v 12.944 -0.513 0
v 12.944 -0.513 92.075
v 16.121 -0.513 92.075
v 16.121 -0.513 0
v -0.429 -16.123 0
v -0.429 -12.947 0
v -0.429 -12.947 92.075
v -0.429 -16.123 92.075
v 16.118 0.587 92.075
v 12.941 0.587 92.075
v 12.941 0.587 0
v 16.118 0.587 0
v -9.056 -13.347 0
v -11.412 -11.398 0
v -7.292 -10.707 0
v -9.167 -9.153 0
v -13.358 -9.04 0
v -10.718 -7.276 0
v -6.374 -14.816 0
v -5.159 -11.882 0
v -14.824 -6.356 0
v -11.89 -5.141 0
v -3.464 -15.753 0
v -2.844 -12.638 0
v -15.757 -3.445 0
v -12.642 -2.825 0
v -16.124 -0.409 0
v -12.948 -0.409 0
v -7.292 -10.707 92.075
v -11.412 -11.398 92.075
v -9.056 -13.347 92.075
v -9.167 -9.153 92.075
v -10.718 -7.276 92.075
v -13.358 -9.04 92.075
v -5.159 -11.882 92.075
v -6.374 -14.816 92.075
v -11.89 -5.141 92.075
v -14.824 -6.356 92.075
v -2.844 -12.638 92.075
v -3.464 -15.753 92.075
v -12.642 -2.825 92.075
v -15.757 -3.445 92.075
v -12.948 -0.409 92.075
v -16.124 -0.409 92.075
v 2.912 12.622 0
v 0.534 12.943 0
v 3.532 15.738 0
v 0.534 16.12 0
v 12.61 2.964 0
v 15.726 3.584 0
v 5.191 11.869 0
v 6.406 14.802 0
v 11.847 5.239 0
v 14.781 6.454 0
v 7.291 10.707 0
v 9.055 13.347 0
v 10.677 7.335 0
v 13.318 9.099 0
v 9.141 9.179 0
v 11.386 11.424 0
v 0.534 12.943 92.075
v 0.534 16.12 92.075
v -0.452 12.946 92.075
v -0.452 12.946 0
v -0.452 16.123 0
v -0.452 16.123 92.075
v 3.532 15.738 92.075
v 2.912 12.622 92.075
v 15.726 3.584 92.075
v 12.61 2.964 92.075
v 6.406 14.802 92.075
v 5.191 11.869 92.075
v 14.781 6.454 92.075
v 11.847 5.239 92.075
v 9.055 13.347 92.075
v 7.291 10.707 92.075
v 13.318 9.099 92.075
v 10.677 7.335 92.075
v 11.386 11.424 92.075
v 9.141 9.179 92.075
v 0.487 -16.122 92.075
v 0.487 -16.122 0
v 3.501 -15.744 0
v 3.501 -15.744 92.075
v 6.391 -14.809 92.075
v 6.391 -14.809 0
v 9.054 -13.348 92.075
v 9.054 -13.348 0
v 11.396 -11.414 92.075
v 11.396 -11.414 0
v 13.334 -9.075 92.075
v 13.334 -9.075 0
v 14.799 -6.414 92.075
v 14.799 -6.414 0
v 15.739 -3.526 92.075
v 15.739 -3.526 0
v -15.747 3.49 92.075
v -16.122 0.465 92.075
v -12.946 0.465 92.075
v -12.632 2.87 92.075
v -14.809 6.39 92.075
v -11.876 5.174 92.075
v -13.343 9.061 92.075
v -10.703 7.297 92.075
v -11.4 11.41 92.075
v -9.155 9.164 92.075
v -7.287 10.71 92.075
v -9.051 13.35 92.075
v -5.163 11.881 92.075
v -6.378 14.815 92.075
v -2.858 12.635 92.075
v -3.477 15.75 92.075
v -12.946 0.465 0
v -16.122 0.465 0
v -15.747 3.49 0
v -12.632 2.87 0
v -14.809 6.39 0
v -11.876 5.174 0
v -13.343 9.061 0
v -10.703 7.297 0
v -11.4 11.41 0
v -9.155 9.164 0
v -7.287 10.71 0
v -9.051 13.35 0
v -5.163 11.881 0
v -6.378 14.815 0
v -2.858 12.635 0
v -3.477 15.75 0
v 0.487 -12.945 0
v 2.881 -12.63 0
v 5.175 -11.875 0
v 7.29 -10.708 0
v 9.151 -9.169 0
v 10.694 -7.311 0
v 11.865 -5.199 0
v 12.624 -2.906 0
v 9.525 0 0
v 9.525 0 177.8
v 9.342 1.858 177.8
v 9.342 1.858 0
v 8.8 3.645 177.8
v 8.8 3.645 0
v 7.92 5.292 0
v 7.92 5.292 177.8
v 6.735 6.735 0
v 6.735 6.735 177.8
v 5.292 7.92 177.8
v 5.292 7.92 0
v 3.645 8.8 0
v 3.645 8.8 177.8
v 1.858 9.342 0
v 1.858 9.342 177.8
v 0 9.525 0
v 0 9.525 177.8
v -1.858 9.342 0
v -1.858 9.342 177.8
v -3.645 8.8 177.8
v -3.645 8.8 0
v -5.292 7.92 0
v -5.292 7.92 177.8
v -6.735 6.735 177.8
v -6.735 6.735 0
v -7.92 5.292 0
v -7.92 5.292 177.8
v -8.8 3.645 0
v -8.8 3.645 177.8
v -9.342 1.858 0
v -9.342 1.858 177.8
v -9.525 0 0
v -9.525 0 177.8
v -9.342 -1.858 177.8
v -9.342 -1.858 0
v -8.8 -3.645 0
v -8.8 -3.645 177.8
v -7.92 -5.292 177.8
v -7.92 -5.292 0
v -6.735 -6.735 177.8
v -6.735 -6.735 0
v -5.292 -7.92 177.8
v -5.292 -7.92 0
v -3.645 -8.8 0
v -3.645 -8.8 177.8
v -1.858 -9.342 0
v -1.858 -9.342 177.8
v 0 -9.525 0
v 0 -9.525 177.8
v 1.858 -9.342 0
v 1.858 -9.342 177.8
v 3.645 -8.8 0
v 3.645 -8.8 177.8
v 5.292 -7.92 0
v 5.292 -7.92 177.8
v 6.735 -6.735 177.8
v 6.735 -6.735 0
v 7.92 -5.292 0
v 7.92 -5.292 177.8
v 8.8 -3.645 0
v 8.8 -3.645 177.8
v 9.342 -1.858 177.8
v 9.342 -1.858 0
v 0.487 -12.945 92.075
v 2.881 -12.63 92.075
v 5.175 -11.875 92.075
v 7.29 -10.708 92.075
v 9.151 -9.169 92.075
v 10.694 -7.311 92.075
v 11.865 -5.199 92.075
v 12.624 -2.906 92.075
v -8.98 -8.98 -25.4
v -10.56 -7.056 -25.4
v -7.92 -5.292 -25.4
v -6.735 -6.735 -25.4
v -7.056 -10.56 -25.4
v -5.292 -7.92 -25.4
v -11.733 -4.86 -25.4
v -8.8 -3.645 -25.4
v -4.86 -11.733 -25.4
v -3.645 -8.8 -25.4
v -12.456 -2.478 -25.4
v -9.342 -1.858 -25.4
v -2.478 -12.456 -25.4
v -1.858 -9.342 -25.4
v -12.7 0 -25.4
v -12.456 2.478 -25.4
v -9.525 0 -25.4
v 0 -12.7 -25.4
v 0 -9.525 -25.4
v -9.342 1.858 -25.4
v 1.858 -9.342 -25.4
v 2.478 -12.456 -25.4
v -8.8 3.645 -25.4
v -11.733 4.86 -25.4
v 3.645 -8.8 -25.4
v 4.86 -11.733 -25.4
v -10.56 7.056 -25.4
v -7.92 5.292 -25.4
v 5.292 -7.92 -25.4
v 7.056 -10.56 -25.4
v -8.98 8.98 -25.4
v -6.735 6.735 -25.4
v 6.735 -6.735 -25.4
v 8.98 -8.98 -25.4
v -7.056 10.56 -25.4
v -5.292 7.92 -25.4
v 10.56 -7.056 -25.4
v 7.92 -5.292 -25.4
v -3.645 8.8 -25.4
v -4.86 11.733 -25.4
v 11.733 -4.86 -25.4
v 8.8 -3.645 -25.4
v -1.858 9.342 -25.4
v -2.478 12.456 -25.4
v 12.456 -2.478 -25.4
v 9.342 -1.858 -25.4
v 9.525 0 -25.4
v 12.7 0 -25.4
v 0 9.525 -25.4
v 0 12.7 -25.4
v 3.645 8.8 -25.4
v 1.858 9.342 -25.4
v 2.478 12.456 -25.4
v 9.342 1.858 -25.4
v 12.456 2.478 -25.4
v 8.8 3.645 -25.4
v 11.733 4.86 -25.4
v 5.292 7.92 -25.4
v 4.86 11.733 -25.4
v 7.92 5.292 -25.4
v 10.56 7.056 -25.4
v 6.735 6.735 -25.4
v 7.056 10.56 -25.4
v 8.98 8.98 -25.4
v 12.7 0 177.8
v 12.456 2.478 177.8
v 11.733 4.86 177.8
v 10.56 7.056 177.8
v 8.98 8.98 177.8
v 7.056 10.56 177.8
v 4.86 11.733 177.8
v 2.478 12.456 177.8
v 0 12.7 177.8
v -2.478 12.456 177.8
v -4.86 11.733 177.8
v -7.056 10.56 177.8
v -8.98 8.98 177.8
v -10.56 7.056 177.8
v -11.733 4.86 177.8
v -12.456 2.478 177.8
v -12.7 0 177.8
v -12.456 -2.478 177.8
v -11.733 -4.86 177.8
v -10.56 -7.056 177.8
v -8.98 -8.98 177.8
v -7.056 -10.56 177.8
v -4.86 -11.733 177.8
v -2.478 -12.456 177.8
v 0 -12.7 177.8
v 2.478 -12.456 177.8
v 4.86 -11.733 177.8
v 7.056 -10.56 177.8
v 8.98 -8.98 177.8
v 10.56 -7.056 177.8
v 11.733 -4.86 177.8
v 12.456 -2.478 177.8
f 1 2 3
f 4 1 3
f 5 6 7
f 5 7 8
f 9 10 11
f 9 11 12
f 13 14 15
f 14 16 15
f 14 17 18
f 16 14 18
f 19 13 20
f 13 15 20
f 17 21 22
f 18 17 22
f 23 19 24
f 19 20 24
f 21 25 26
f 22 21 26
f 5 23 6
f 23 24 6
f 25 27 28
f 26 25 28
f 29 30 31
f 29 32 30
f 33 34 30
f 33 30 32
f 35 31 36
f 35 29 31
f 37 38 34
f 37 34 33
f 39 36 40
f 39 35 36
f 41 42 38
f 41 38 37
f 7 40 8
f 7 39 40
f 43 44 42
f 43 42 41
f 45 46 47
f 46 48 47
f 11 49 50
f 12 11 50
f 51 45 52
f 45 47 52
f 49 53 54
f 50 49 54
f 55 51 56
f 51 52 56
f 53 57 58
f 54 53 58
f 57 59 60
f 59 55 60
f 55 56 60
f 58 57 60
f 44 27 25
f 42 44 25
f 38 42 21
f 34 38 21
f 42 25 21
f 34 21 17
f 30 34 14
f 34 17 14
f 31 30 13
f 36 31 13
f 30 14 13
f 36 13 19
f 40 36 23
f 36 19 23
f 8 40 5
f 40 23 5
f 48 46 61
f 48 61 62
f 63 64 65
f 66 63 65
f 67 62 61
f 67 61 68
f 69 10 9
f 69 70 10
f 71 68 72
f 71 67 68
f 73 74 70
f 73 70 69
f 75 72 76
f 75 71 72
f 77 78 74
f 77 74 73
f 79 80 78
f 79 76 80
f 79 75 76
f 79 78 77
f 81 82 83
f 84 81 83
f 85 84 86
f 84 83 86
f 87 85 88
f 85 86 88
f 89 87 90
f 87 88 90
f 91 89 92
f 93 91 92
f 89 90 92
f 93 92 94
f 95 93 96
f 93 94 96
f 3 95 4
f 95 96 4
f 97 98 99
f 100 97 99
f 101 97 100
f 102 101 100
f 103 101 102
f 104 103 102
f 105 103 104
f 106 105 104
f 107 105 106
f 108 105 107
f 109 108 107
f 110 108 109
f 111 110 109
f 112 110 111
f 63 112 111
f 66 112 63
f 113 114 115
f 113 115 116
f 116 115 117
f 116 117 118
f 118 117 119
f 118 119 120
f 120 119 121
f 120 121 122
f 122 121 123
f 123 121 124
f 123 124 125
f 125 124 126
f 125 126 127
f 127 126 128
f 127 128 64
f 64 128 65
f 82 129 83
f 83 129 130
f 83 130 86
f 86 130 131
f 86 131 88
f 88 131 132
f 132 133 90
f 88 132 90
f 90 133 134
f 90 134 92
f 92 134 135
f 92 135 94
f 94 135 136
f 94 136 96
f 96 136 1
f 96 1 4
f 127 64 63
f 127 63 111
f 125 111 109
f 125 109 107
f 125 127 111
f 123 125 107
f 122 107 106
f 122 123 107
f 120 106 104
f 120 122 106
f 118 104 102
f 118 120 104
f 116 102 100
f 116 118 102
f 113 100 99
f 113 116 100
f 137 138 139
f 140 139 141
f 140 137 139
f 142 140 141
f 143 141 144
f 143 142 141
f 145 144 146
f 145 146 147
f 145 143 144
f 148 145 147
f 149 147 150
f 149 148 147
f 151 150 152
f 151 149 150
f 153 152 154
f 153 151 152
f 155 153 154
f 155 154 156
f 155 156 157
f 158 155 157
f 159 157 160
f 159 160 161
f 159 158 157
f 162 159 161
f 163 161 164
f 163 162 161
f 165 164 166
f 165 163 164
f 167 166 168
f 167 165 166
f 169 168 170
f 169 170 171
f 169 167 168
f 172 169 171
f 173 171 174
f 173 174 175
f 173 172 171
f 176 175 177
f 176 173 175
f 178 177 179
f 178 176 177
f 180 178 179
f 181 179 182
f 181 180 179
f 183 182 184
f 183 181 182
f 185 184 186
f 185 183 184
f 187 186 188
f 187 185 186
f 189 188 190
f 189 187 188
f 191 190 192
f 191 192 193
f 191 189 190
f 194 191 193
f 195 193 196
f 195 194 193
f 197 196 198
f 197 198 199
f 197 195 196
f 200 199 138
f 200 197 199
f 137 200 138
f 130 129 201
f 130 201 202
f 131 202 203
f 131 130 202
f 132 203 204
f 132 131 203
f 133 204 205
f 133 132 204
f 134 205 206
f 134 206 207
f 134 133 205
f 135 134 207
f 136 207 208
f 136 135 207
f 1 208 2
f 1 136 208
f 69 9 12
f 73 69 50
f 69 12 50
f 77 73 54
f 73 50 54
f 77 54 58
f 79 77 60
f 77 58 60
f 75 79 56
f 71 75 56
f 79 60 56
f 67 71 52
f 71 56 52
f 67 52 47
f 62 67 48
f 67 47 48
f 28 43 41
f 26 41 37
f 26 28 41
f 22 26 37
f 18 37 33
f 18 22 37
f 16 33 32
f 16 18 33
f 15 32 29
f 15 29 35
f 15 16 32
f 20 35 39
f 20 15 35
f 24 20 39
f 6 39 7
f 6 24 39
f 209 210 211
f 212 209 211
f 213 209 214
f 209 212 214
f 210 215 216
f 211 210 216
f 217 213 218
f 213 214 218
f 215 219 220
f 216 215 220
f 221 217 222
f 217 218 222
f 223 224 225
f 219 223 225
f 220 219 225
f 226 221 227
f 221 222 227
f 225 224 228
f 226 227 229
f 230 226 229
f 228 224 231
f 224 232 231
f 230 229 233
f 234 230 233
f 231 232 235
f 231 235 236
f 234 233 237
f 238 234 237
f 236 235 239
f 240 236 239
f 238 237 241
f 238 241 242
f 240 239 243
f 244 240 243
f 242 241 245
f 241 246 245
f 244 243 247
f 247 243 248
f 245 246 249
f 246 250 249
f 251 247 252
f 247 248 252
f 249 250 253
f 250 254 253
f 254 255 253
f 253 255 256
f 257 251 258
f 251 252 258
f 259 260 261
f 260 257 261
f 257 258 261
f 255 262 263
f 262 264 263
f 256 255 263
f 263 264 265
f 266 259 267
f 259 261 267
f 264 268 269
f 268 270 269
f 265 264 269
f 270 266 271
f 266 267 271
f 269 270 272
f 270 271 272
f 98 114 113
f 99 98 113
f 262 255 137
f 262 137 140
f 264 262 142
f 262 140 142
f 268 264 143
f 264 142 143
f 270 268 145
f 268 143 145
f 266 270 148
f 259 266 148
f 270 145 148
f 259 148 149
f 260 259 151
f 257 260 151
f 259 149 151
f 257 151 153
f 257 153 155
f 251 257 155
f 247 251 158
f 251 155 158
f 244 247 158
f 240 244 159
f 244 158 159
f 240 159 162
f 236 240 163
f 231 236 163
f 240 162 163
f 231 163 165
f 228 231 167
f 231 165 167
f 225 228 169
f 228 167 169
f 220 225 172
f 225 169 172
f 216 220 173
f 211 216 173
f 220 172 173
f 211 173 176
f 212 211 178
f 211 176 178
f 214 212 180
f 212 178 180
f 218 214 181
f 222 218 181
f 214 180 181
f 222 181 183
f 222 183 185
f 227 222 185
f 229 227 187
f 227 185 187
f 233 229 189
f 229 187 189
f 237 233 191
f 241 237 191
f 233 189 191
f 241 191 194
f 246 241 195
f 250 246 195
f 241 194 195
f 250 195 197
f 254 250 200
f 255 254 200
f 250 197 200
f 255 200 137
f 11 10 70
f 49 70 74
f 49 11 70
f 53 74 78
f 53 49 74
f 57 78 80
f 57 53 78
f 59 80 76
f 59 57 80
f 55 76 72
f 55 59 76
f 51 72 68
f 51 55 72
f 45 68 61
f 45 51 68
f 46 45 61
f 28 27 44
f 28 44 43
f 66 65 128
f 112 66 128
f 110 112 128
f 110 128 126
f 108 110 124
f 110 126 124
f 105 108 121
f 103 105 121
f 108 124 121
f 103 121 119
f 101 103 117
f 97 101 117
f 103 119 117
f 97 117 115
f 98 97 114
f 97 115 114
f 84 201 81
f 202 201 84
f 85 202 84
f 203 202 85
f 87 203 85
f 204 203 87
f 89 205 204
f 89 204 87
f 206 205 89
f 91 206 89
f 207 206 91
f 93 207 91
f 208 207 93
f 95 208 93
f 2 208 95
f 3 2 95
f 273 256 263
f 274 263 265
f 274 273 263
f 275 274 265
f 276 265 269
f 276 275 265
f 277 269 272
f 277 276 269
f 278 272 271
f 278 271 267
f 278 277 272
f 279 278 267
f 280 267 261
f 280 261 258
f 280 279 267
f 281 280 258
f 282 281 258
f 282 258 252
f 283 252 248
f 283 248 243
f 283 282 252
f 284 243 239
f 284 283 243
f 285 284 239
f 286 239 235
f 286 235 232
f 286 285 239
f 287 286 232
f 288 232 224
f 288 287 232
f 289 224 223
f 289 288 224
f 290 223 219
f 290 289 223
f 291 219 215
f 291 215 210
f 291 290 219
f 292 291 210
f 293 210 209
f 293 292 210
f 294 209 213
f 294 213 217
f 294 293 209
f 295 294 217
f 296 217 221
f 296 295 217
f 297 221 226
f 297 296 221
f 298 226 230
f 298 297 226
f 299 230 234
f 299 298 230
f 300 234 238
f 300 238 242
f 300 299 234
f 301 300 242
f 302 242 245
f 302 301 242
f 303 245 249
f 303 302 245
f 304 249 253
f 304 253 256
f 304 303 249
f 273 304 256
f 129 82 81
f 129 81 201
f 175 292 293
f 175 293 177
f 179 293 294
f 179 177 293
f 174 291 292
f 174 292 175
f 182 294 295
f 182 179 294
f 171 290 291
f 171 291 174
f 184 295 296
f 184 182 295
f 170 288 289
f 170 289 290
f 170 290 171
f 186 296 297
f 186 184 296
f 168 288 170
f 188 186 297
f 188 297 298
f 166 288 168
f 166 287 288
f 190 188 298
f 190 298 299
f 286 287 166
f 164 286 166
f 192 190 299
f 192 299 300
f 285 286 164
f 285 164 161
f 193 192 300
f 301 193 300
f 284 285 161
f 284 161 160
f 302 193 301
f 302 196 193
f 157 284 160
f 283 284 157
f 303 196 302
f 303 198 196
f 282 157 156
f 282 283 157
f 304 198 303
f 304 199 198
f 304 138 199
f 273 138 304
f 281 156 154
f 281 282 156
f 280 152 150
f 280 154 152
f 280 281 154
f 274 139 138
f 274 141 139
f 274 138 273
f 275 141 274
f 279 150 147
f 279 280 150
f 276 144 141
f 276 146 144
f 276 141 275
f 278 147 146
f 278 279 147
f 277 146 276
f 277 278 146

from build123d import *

# Parameters (mm, degrees)
F0_R     = 12.7
F0_R_2   = 9.525
F1_DEPTH = 177.8
F2_R     = 16.129
F2_R_2   = 12.954
F3_DEPTH = 92.075
F4_W     = 3.7774993107
F4_H     = 1.0993301403
F5_DEPTH = 177.801
F6_W     = 3.6055315286
F6_H     = 0.8748579712
F6_W_2   = 0.9862377919
F6_H_2   = 3.7802174482
F7_DEPTH = 92.075
F8_DEPTH = 25.4


# Not quite as in the source:
# - a feature names something its author has since deleted; it is built from what else it names


with BuildPart() as f1:
    # F0 (on Top) → F1 (new body)
    with BuildSketch(Plane.XY):
        Circle(F0_R)
        Circle(F0_R_2, mode=Mode.SUBTRACT)
    extrude(amount=F1_DEPTH)

    # F8 (add): a face of the model
    f8_faces = [f1.faces().sort_by_distance(p)[0] for p in [
        (-12.3407897552, 0, 0),
    ]]
    extrude(f8_faces, amount=F8_DEPTH)


with BuildPart() as f3:
    # F2 (on Top) → F3 (new body)
    with BuildSketch(Plane.XY):
        Circle(F2_R)
        Circle(F2_R_2, mode=Mode.SUBTRACT)
    extrude(amount=F3_DEPTH)

    # F4 (on Top) → F5 (cut, through all)
    with BuildSketch(Plane.XY):
        with Locations((14.8086710833, 0.0370488851)):
            Rectangle(F4_W, F4_H)
    extrude(amount=F5_DEPTH, mode=Mode.SUBTRACT)

    # F6 (on Top) → F7 (cut, through all)
    with BuildSketch(Plane.XY):
        with Locations((-14.6675733849, 0.0279923697)):
            Rectangle(F6_W, F6_H)
        Polygon((0.4868659598, -12.8129947375), (-0.4289262579, -12.8546217456), (-0.4289262579, -16.4708271623), (0.4868659598, -16.4708271623), align=None)
        with Locations((0.0407108382, 14.701657732)):
            Rectangle(F6_W_2, F6_H_2)
    extrude(amount=F7_DEPTH, mode=Mode.SUBTRACT)


solid = Compound([f1.part, f3.part])
